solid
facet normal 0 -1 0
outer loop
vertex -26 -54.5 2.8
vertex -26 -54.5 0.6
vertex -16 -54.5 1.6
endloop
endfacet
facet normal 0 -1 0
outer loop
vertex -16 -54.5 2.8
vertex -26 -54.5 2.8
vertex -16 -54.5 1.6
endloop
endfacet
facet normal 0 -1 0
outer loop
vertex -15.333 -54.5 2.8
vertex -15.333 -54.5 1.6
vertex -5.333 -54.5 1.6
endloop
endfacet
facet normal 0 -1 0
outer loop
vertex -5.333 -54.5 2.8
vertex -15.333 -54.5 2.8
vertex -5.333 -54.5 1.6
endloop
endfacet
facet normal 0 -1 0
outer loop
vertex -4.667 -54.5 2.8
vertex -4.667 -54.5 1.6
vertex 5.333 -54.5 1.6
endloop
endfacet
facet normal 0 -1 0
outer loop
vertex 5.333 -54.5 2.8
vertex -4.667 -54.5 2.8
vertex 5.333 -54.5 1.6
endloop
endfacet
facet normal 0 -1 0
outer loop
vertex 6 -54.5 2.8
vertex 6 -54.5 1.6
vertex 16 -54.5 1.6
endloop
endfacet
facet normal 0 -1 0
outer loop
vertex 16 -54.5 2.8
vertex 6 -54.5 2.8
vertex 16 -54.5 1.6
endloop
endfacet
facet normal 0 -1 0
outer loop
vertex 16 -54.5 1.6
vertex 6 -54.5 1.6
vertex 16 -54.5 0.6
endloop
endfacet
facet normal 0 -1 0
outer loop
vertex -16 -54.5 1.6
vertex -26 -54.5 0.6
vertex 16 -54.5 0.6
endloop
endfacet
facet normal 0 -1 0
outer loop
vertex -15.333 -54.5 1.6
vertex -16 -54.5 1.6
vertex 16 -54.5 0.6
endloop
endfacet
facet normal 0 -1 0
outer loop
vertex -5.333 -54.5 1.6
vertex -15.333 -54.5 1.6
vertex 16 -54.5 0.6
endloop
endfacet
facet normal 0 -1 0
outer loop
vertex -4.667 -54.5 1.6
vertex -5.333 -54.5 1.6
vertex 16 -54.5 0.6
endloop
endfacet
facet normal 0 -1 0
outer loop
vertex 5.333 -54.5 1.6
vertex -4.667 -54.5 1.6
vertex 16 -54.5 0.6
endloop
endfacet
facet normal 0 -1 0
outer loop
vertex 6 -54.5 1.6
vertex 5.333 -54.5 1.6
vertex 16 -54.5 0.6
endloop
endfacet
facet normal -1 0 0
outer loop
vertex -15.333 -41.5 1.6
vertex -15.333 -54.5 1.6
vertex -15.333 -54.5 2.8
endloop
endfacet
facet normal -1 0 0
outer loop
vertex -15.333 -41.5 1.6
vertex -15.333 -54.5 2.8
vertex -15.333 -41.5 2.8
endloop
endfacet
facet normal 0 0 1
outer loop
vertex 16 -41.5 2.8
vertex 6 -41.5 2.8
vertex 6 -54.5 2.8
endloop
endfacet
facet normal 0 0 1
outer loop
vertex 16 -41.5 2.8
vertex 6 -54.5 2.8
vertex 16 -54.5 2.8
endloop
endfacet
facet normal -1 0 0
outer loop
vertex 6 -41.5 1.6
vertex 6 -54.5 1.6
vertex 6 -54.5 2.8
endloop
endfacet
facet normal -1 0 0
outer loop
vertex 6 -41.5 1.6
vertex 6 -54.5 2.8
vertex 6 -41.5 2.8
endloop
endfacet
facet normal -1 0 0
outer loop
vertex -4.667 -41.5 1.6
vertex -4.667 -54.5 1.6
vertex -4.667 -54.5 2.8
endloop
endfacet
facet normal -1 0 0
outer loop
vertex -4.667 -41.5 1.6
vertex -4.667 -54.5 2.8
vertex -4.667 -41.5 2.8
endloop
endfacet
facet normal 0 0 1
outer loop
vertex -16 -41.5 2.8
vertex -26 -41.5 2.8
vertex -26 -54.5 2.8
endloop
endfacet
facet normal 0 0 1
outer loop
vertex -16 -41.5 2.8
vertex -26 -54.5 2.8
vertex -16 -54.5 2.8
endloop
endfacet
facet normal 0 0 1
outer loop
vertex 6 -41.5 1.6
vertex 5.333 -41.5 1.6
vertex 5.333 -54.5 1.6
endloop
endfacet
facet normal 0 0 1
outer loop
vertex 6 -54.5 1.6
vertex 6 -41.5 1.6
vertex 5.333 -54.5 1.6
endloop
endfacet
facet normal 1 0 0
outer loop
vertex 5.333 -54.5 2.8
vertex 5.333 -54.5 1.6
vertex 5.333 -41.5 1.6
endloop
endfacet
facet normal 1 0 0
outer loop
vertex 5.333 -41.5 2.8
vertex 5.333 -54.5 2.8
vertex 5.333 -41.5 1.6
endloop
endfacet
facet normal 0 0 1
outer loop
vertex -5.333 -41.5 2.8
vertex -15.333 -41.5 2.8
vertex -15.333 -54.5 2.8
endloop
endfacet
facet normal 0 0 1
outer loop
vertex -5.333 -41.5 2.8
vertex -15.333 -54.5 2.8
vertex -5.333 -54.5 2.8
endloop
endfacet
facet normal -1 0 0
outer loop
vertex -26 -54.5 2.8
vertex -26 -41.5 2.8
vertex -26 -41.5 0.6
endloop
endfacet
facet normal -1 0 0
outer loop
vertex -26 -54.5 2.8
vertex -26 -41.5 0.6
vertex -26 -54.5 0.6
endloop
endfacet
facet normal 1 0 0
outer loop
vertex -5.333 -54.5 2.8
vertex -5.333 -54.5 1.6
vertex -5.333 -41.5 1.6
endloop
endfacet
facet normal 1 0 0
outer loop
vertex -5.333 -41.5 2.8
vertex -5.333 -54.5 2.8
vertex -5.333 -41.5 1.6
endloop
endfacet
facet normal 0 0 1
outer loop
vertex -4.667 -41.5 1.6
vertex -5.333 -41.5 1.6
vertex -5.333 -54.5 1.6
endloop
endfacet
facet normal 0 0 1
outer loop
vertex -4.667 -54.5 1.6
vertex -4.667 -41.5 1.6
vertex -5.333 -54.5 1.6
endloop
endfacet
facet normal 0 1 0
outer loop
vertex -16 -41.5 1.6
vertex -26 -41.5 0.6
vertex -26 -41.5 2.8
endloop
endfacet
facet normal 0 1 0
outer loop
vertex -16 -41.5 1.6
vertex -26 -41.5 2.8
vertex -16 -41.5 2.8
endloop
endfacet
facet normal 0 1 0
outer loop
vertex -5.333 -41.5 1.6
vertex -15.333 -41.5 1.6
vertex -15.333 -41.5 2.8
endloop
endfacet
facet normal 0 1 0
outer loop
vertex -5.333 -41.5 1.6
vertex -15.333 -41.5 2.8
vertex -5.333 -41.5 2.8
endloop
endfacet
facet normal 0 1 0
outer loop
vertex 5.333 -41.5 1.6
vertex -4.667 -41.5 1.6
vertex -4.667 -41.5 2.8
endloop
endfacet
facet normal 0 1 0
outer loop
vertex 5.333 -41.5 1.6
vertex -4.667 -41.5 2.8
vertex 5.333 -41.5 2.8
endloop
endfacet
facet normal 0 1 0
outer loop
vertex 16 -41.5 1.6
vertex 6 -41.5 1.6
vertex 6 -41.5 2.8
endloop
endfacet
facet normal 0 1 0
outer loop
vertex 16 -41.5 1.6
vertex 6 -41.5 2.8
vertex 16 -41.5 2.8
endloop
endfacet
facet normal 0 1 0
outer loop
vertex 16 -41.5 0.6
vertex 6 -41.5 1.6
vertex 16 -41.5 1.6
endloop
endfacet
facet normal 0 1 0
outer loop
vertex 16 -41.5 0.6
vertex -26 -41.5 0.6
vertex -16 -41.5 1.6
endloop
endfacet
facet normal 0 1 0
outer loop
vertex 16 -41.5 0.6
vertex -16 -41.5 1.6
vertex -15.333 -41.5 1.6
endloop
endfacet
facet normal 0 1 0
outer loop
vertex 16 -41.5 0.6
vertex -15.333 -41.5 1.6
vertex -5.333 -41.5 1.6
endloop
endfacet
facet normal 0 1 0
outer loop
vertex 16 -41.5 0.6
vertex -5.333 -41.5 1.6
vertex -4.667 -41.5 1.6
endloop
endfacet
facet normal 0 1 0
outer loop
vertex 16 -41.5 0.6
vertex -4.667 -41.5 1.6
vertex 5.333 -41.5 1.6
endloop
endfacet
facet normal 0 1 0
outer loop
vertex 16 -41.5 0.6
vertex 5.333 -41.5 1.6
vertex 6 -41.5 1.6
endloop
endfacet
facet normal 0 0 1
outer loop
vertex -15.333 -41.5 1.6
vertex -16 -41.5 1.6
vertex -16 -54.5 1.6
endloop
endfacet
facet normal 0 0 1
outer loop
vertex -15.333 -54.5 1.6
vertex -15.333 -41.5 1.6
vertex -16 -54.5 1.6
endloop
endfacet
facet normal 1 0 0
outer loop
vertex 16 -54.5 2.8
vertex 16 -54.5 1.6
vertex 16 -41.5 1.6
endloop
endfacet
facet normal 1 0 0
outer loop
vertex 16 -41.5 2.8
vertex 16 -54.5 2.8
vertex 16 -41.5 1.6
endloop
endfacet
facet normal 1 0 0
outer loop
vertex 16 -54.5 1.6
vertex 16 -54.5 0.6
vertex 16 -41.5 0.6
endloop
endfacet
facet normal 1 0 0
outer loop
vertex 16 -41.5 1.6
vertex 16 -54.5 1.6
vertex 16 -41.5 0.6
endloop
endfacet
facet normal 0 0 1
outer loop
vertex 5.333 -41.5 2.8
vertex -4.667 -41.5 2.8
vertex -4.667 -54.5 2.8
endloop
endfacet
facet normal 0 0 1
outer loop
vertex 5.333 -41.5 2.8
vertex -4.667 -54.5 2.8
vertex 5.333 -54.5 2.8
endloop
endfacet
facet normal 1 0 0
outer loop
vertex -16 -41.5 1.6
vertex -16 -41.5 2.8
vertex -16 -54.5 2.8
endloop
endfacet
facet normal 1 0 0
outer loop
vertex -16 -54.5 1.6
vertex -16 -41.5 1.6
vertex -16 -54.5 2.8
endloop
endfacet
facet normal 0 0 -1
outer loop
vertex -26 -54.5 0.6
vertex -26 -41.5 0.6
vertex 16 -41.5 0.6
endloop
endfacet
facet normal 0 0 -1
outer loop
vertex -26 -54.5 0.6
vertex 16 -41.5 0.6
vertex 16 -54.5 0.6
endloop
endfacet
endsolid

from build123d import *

# Parameters (mm, degrees)
SKETCH021_W            = 10
SKETCH021_H            = 13
PAD_DEPTH              = 1.2
PAD_FACE5_W            = 13
PAD_FACE5_H            = 10
PAD008_DEPTH           = 1
PAD008_FACE8_W         = 13
PAD008_FACE8_H         = 1
PAD009_DEPTH           = 32
LINEARPATTERN004_COUNT = 4
LINEARPATTERN004_PITCH = 10.6666666667


with BuildPart() as part:
    # Sketch021 → Pad (new body)
    with BuildSketch(Plane.XY):
        Rectangle(SKETCH021_W, SKETCH021_H)
    pad = extrude(amount=PAD_DEPTH)

    # Pad Face5 → Pad008 (add)
    with BuildSketch(Plane(origin=(0, 0, 0), x_dir=(0, -1, 0), z_dir=(0, 0, -1))):
        Rectangle(PAD_FACE5_W, PAD_FACE5_H)
    extrude(amount=PAD008_DEPTH)

    # Pad008 Face8 → Pad009 (add)
    with BuildSketch(Plane(origin=(5, 0, -0.5), x_dir=(0, -1, 0), z_dir=(1, 0, 0))):
        Rectangle(PAD008_FACE8_W, PAD008_FACE8_H)
    extrude(amount=PAD009_DEPTH)

    # LinearPattern004: Pad ×4
    with Locations(*[(i * LINEARPATTERN004_PITCH, 0, 0) for i in range(1, LINEARPATTERN004_COUNT)]):
        add(pad)


with BuildPart() as part_1:
    # Body004 placement: moved
    add(part.part.moved(Location((-21, -48, 1.6))))


solid = part_1.part
